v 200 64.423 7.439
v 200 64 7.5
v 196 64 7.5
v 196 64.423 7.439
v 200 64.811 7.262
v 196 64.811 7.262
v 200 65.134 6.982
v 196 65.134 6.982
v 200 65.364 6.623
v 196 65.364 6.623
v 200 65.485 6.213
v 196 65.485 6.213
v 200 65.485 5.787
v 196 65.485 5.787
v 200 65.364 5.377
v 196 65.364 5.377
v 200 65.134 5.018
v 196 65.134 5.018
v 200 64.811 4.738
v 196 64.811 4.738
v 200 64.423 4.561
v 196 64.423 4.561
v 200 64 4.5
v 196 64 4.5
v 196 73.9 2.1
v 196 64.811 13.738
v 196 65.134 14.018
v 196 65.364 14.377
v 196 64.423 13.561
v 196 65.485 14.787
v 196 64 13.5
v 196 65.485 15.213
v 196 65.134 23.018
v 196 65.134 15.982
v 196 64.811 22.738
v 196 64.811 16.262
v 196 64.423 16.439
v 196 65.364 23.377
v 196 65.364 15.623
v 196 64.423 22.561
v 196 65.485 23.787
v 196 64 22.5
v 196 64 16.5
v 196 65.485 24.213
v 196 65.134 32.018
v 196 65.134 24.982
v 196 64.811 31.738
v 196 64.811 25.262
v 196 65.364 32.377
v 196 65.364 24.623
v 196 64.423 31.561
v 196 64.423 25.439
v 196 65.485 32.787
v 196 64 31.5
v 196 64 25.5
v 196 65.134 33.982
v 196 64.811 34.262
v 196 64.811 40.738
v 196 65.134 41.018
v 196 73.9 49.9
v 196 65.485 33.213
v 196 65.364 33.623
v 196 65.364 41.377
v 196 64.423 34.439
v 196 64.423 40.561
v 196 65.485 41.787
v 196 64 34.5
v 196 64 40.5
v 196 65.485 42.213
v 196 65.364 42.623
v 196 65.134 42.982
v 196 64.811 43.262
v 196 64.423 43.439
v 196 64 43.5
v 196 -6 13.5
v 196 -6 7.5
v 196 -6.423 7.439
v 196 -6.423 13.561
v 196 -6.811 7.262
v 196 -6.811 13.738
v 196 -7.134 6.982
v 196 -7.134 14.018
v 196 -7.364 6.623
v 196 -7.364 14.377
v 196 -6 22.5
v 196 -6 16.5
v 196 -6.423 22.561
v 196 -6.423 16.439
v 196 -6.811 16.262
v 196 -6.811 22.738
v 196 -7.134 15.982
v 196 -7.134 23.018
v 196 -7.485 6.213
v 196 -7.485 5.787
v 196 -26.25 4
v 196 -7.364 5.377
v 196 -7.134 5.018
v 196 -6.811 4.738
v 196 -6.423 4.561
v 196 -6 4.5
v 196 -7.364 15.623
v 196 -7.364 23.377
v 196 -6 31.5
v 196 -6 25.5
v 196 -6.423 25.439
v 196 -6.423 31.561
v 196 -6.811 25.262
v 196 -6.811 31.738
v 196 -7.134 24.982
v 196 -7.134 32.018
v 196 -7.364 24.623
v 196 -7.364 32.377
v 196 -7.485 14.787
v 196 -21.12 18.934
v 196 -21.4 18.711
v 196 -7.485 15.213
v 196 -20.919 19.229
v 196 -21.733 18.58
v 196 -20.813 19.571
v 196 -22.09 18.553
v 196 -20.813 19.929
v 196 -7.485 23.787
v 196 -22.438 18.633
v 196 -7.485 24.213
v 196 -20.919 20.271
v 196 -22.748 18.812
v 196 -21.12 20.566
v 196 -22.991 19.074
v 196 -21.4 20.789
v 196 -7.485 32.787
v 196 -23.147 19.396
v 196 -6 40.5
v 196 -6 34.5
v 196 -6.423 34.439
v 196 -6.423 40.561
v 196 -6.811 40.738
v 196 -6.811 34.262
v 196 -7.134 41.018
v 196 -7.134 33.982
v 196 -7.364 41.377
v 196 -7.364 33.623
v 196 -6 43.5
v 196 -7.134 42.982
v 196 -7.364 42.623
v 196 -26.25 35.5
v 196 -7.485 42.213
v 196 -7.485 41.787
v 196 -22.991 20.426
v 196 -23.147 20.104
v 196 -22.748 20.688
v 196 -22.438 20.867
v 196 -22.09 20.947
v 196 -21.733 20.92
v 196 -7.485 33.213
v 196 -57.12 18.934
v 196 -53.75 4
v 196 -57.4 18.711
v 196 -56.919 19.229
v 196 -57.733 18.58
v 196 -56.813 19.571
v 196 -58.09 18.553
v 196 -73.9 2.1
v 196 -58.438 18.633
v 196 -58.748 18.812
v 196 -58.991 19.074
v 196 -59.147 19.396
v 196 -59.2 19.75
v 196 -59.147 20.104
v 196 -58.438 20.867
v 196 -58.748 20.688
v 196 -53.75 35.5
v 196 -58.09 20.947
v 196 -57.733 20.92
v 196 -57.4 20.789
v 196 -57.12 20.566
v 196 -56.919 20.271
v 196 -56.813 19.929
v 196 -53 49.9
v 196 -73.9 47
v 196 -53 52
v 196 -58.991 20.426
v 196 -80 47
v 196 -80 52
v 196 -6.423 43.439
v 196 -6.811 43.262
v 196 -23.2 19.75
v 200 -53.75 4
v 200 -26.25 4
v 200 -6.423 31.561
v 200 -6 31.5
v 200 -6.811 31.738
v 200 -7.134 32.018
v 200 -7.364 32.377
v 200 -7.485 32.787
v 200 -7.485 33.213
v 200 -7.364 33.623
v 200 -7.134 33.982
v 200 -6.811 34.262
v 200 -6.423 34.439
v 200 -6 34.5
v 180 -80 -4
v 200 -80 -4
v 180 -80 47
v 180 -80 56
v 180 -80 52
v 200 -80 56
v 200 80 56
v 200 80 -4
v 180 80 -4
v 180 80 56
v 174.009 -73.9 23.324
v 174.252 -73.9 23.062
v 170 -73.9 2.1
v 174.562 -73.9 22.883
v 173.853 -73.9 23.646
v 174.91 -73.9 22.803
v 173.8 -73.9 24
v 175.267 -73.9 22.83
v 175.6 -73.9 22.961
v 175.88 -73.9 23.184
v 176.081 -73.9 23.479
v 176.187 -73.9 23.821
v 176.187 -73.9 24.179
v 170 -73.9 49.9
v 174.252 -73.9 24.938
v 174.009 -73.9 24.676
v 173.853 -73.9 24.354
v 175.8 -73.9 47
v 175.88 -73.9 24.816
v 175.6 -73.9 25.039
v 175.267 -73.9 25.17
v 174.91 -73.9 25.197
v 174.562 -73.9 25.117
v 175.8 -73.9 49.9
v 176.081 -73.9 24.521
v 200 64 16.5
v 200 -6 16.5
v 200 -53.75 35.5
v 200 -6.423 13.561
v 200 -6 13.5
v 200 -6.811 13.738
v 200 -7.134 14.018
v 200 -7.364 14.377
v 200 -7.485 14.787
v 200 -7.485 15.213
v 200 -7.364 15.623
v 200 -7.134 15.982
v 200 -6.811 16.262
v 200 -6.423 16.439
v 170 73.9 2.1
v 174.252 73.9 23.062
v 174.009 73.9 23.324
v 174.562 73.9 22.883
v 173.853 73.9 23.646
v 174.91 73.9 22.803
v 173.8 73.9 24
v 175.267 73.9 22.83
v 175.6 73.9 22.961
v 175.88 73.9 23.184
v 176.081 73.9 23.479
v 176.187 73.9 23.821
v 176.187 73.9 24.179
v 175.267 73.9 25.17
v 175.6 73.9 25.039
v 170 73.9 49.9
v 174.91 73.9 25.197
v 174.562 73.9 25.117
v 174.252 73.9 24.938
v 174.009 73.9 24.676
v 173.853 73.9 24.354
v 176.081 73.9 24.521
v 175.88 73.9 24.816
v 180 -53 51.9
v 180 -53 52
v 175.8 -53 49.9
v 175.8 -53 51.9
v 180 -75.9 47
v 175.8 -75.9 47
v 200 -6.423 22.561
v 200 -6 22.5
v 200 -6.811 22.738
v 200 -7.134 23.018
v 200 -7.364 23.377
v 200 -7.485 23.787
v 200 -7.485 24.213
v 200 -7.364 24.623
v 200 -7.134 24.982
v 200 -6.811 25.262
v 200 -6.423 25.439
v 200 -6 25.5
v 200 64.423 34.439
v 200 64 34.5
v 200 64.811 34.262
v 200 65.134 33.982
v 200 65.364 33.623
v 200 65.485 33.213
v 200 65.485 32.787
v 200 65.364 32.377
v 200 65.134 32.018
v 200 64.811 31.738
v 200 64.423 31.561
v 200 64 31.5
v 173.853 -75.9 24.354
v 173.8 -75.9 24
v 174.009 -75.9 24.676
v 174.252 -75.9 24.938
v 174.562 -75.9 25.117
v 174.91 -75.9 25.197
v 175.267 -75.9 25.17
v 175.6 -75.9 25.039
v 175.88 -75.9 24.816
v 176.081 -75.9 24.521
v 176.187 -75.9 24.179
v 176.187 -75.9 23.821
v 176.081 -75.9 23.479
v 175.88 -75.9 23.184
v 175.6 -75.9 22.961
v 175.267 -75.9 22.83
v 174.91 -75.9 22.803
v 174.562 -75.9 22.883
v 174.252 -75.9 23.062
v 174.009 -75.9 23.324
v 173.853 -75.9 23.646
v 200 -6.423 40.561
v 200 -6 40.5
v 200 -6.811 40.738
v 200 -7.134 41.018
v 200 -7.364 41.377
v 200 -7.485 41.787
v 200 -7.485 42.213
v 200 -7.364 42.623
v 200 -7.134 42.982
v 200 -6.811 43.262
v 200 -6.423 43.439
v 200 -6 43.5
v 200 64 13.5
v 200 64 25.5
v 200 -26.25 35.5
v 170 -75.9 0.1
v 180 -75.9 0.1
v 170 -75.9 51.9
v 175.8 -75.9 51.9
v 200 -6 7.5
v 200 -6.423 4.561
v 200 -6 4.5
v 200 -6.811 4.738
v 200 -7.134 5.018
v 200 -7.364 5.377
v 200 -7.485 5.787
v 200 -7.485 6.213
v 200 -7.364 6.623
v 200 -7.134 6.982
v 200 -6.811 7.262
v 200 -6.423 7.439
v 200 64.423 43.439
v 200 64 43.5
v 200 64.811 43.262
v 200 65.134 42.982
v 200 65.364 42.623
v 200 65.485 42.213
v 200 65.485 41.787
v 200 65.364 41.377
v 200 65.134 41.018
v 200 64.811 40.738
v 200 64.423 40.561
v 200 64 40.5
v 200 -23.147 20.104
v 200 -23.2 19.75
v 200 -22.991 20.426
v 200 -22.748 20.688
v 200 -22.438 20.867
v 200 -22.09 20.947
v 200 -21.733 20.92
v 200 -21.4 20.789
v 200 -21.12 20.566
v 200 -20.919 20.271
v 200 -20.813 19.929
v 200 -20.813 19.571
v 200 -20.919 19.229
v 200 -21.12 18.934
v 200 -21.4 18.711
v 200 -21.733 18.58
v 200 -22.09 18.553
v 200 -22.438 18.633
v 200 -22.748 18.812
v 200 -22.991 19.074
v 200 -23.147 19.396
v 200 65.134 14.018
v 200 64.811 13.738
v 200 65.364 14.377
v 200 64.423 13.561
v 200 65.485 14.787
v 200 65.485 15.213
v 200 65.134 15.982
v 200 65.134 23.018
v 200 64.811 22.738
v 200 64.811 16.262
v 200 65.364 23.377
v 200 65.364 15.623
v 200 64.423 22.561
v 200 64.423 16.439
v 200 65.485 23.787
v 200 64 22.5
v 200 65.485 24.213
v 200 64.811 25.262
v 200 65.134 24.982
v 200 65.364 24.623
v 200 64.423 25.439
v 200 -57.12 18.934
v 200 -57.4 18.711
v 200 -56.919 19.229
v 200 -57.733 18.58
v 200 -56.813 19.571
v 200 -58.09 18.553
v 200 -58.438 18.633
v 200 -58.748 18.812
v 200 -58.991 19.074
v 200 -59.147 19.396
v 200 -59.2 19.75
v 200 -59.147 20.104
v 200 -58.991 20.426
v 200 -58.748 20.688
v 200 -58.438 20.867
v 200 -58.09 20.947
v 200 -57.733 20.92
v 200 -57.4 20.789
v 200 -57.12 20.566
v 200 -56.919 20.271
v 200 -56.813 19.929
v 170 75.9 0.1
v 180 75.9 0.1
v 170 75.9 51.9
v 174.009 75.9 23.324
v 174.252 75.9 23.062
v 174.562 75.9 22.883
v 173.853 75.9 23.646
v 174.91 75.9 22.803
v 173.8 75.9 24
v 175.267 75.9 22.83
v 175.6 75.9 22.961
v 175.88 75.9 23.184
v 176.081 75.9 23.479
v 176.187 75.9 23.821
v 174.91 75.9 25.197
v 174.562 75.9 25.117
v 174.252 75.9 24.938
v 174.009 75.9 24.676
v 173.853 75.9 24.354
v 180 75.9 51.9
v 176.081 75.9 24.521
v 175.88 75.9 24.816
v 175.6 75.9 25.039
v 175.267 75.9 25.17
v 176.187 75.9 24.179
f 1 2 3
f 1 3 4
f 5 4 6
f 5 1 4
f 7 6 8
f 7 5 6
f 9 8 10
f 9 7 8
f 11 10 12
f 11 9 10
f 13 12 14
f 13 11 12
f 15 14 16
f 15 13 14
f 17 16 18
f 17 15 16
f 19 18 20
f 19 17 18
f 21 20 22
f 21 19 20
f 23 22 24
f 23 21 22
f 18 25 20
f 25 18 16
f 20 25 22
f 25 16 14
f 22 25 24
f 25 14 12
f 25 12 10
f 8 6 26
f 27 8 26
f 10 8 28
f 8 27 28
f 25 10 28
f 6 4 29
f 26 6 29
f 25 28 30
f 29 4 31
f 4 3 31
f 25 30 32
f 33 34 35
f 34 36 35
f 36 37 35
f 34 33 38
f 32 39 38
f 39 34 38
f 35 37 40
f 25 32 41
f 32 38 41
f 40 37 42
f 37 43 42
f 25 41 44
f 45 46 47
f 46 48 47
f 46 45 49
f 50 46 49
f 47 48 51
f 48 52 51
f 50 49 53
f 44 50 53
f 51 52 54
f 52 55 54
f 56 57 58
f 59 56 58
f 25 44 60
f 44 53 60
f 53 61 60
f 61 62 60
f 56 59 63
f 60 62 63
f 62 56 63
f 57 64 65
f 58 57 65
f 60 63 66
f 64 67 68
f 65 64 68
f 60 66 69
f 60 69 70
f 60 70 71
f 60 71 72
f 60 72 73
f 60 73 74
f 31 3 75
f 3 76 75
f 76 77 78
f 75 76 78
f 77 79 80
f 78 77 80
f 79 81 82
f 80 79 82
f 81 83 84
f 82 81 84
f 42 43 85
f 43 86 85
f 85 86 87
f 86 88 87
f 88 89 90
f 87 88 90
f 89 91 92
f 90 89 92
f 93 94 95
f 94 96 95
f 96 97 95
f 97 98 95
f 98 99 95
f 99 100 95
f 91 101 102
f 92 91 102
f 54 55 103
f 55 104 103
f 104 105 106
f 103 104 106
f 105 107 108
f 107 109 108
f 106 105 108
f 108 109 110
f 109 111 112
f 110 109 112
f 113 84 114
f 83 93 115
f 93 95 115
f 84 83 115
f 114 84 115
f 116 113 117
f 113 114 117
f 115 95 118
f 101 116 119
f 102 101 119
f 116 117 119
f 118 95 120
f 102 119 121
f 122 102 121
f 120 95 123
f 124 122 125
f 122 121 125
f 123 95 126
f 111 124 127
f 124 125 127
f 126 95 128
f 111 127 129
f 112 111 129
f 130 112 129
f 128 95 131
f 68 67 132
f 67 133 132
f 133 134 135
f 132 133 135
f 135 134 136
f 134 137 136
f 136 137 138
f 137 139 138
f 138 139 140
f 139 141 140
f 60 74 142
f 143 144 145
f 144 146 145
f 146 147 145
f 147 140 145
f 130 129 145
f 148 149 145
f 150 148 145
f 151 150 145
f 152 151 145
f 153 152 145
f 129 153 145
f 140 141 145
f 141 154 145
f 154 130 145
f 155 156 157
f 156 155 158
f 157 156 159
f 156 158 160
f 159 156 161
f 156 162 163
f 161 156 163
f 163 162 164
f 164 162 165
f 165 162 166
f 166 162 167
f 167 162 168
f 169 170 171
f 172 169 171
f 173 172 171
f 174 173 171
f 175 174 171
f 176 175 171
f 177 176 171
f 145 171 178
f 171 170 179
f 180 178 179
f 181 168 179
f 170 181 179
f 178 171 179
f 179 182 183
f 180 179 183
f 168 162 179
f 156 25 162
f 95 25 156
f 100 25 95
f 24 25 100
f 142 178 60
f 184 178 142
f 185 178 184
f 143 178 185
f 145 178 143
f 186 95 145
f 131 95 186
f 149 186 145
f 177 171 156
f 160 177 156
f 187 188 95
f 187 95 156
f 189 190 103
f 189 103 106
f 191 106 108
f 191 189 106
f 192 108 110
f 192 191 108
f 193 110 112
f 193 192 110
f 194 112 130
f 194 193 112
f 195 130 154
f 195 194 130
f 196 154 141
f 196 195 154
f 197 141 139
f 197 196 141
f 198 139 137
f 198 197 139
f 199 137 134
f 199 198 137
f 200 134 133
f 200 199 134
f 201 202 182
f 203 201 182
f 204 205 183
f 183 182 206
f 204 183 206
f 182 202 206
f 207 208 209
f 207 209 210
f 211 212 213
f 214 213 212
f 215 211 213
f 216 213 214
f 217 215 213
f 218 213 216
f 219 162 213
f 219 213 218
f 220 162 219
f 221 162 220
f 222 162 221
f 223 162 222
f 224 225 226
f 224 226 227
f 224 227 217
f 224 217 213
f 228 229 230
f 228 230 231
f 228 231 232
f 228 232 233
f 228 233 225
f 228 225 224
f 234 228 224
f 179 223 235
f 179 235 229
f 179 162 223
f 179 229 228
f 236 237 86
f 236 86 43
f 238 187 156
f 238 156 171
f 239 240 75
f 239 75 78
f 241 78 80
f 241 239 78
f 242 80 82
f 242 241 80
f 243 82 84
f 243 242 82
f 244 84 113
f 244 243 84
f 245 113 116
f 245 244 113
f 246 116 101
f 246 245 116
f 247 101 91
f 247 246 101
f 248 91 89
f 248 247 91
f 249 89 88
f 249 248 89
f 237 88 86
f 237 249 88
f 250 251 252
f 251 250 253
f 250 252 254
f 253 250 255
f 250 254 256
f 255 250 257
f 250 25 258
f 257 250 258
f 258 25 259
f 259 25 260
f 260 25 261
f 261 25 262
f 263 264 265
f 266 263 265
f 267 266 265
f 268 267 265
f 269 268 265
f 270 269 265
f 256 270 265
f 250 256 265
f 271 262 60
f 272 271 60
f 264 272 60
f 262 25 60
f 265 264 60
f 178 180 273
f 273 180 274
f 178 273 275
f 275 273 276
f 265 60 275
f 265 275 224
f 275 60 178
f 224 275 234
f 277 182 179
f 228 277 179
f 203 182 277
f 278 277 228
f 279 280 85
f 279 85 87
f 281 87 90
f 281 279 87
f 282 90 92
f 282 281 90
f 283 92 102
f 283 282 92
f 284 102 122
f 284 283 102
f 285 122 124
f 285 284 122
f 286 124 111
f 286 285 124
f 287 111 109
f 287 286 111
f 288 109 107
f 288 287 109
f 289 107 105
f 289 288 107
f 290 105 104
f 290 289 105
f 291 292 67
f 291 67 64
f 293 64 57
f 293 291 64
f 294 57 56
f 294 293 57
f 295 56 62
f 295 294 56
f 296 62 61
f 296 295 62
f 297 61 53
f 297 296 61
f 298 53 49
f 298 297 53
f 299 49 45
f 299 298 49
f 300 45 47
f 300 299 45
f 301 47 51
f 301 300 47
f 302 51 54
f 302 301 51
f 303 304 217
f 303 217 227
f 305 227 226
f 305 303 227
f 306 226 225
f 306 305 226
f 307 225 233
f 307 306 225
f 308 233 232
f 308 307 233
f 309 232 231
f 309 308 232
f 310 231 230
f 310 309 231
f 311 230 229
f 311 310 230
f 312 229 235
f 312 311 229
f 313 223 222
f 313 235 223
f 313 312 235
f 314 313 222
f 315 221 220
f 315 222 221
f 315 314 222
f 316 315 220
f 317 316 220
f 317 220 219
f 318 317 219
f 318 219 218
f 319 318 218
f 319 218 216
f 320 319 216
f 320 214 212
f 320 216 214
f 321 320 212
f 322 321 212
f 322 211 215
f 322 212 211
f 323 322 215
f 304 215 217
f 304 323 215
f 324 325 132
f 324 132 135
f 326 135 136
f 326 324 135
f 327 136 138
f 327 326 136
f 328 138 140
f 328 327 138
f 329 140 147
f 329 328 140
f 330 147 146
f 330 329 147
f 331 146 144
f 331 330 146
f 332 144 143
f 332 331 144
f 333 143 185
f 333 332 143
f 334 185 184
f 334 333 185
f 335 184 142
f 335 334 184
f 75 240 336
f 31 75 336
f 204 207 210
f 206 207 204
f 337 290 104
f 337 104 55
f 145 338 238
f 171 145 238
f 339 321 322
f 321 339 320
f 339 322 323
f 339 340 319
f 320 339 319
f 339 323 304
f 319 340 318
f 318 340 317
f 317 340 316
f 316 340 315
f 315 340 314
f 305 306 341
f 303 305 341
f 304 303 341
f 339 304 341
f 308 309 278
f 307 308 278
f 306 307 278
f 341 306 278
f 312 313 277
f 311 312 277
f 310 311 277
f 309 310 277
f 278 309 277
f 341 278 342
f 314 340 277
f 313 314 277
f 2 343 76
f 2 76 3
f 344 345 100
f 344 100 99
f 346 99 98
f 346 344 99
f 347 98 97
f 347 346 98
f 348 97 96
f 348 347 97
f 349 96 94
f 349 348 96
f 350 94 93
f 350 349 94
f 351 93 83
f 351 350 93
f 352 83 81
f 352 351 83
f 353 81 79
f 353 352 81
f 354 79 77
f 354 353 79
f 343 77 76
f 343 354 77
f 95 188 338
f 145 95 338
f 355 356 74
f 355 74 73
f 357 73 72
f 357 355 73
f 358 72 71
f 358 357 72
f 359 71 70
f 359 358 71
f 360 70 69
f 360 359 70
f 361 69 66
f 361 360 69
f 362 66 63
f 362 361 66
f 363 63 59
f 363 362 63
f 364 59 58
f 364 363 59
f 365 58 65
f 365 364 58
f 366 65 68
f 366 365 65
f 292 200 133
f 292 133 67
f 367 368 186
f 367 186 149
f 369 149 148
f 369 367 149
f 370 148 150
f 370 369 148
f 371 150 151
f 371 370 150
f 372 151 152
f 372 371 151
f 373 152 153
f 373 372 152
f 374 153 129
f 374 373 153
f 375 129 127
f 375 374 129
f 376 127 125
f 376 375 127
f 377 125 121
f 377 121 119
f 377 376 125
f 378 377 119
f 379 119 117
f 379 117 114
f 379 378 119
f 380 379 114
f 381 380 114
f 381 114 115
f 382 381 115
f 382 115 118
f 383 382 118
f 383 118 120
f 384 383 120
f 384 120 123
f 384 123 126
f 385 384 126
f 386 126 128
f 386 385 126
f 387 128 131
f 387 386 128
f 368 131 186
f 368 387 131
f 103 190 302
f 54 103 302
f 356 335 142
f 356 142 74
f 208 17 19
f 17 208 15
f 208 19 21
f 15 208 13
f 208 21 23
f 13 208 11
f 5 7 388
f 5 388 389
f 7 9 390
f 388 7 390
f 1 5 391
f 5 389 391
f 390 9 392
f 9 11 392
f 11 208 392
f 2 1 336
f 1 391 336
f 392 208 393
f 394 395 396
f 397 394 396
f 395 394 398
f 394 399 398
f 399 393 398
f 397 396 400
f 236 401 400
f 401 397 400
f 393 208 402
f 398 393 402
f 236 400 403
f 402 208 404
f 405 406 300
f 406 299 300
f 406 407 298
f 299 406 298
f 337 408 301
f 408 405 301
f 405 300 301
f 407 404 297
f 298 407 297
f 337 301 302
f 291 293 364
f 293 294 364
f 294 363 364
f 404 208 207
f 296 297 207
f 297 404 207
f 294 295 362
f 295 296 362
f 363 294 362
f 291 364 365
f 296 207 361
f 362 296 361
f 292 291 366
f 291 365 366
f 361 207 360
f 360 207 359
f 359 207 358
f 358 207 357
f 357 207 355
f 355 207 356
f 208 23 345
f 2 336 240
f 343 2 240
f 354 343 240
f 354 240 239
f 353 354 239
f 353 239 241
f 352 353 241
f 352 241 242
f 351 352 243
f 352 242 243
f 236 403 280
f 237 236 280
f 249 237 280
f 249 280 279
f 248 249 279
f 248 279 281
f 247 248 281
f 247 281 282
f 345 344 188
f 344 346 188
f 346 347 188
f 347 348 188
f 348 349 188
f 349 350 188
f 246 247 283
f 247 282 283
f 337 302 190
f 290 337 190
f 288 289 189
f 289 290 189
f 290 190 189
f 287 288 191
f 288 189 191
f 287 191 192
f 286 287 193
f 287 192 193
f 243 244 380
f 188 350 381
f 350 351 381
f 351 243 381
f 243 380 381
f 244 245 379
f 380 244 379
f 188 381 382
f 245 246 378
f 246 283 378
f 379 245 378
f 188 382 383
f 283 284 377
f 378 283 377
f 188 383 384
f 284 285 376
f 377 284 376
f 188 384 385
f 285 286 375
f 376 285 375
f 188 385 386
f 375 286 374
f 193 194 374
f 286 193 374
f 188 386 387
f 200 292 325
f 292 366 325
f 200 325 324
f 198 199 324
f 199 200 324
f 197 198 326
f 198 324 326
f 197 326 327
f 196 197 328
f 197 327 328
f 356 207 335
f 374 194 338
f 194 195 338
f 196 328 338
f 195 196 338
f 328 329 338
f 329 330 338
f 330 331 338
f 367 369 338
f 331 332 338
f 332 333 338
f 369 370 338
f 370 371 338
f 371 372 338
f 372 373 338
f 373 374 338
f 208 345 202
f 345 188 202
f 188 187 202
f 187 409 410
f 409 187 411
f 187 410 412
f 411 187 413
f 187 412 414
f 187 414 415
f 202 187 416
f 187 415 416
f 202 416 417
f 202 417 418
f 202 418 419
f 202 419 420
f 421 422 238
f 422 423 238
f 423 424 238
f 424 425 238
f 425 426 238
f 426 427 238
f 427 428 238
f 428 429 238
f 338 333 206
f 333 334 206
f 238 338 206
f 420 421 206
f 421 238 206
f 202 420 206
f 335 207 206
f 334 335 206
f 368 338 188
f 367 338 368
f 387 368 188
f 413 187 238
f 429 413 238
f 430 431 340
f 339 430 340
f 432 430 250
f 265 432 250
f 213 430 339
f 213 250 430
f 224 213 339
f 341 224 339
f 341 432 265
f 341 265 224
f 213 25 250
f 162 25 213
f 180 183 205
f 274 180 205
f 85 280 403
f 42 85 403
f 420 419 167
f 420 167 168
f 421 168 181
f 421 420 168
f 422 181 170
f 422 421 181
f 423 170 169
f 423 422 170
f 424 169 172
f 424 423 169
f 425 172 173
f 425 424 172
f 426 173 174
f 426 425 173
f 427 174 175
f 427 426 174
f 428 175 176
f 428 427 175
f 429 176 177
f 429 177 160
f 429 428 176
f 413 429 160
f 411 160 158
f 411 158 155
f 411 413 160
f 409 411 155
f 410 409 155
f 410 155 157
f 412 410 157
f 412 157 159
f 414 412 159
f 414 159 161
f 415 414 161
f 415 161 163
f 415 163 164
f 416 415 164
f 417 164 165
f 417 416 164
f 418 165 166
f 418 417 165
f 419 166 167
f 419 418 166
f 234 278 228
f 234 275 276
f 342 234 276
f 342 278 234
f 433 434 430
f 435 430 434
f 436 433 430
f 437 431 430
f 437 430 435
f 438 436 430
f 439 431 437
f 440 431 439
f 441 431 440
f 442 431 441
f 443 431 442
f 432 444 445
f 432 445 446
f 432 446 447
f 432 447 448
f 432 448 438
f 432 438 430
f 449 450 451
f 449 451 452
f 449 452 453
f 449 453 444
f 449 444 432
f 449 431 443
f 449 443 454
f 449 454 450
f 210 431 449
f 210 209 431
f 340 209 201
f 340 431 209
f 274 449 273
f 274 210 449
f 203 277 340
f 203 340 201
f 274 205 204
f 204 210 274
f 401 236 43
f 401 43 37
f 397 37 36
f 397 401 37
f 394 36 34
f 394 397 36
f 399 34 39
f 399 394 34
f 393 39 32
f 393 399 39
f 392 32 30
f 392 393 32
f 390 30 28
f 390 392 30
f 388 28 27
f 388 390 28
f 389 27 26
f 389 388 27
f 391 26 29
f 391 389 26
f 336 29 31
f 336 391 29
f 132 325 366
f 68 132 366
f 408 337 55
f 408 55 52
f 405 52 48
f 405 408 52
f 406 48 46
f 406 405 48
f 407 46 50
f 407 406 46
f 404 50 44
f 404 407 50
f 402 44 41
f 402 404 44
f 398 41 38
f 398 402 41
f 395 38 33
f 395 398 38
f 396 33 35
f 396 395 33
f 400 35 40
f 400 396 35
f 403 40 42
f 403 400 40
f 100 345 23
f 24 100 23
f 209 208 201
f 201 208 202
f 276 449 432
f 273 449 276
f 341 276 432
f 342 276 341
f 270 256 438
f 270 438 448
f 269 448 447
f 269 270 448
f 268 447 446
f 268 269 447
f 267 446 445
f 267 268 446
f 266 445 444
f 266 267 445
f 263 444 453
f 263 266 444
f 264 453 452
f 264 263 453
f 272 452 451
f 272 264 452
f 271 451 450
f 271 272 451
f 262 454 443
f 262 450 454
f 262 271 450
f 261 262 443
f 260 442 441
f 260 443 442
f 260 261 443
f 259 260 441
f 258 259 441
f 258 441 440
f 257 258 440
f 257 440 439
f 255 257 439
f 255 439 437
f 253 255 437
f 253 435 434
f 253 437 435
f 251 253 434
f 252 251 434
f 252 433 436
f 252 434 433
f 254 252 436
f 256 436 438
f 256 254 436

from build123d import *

# Parameters (mm, degrees)
SKETCH011_W             = 160
SKETCH011_H             = 60
SKETCH011_R             = 1.2
SKETCH011_W_2           = 27.5
SKETCH011_H_2           = 31.5
PAD004_DEPTH            = 4
SKETCH012_W             = 151.8
SKETCH012_H             = 51.8
SKETCH012_W_2           = 147.8
SKETCH012_H_2           = 47.8
PAD005_DEPTH            = 30
SKETCH013_W             = 160
SKETCH013_H             = 60
SKETCH013_W_2           = 151.8
SKETCH013_H_2           = 51.8
PAD006_DEPTH            = 20
SKETCH014_W             = 20.2
SKETCH014_H             = 5
POCKET004_DEPTH         = 27
SKETCH027_R             = 1.2
POCKET014_DEPTH         = 160.001
POCKET015_DEPTH         = 30.001
LINEARPATTERN007_COUNT  = 5
LINEARPATTERN007_PITCH  = 9
BODY002_PLACEMENT_ANGLE = 180


with BuildPart() as part:
    # Sketch011 → Pad004 (new body)
    with BuildSketch(Plane.YZ):
        with Locations((0, 30)):
            Rectangle(SKETCH011_W, SKETCH011_H)
        with Locations((22, 23.75)):
            Circle(SKETCH011_R, mode=Mode.SUBTRACT)
        with Locations((58, 23.75)):
            Circle(SKETCH011_R, mode=Mode.SUBTRACT)
        with Locations((40, 23.75)):
            Rectangle(SKETCH011_W_2, SKETCH011_H_2, mode=Mode.SUBTRACT)
    extrude(amount=PAD004_DEPTH)

    # Sketch012 → Pad005 (join)
    with BuildSketch(Plane.YZ):
        with Locations((0, 30)):
            Rectangle(SKETCH012_W, SKETCH012_H)
        with Locations((0, 30)):
            Rectangle(SKETCH012_W_2, SKETCH012_H_2, mode=Mode.SUBTRACT)
    extrude(amount=PAD005_DEPTH)

    # Sketch013 → Pad006 (join)
    with BuildSketch(Plane.YZ):
        with Locations((0, 30)):
            Rectangle(SKETCH013_W, SKETCH013_H)
        with Locations((0, 30)):
            Rectangle(SKETCH013_W_2, SKETCH013_H_2, mode=Mode.SUBTRACT)
    extrude(amount=PAD006_DEPTH)

    # Sketch014 (on DatumPlane) → Pocket004 (cut)
    with BuildSketch(Plane.XZ.offset(-80)):
        with Locations((14.1, 53.5)):
            Rectangle(SKETCH014_W, SKETCH014_H)
    extrude(amount=POCKET004_DEPTH, mode=Mode.SUBTRACT)

    # Sketch027 (on DatumPlane) → Pocket014 (cut, through all)
    with BuildSketch(Plane.XZ.offset(-80)):
        with Locations((25, 28)):
            Circle(SKETCH027_R)
    extrude(amount=POCKET014_DEPTH, mode=Mode.SUBTRACT)

    # Sketch028 → Pocket015 (cut, through all)
    with BuildSketch(Plane.YZ):
        with BuildLine():
            Line((6, 11.5), (-64, 11.5))
            ThreePointArc((-64, 11.5), (-65.5, 10), (-64, 8.5))
            Line((6, 8.5), (-64, 8.5))
            ThreePointArc((6, 8.5), (7.5, 10), (6, 11.5))
        make_face()
    pocket015 = extrude(amount=POCKET015_DEPTH, mode=Mode.SUBTRACT)

    # LinearPattern007: Pocket015 ×5
    with Locations(*[(0, 0, i * LINEARPATTERN007_PITCH) for i in range(1, LINEARPATTERN007_COUNT)]):
        add(pocket015, mode=Mode.SUBTRACT)


with BuildPart() as part_1:
    # Body002 placement: moved
    add(part.part.moved(Location((200, 0, -4))).rotate(Axis((200, 0, -4), (0, 0, 1)), BODY002_PLACEMENT_ANGLE))


solid = part_1.part
